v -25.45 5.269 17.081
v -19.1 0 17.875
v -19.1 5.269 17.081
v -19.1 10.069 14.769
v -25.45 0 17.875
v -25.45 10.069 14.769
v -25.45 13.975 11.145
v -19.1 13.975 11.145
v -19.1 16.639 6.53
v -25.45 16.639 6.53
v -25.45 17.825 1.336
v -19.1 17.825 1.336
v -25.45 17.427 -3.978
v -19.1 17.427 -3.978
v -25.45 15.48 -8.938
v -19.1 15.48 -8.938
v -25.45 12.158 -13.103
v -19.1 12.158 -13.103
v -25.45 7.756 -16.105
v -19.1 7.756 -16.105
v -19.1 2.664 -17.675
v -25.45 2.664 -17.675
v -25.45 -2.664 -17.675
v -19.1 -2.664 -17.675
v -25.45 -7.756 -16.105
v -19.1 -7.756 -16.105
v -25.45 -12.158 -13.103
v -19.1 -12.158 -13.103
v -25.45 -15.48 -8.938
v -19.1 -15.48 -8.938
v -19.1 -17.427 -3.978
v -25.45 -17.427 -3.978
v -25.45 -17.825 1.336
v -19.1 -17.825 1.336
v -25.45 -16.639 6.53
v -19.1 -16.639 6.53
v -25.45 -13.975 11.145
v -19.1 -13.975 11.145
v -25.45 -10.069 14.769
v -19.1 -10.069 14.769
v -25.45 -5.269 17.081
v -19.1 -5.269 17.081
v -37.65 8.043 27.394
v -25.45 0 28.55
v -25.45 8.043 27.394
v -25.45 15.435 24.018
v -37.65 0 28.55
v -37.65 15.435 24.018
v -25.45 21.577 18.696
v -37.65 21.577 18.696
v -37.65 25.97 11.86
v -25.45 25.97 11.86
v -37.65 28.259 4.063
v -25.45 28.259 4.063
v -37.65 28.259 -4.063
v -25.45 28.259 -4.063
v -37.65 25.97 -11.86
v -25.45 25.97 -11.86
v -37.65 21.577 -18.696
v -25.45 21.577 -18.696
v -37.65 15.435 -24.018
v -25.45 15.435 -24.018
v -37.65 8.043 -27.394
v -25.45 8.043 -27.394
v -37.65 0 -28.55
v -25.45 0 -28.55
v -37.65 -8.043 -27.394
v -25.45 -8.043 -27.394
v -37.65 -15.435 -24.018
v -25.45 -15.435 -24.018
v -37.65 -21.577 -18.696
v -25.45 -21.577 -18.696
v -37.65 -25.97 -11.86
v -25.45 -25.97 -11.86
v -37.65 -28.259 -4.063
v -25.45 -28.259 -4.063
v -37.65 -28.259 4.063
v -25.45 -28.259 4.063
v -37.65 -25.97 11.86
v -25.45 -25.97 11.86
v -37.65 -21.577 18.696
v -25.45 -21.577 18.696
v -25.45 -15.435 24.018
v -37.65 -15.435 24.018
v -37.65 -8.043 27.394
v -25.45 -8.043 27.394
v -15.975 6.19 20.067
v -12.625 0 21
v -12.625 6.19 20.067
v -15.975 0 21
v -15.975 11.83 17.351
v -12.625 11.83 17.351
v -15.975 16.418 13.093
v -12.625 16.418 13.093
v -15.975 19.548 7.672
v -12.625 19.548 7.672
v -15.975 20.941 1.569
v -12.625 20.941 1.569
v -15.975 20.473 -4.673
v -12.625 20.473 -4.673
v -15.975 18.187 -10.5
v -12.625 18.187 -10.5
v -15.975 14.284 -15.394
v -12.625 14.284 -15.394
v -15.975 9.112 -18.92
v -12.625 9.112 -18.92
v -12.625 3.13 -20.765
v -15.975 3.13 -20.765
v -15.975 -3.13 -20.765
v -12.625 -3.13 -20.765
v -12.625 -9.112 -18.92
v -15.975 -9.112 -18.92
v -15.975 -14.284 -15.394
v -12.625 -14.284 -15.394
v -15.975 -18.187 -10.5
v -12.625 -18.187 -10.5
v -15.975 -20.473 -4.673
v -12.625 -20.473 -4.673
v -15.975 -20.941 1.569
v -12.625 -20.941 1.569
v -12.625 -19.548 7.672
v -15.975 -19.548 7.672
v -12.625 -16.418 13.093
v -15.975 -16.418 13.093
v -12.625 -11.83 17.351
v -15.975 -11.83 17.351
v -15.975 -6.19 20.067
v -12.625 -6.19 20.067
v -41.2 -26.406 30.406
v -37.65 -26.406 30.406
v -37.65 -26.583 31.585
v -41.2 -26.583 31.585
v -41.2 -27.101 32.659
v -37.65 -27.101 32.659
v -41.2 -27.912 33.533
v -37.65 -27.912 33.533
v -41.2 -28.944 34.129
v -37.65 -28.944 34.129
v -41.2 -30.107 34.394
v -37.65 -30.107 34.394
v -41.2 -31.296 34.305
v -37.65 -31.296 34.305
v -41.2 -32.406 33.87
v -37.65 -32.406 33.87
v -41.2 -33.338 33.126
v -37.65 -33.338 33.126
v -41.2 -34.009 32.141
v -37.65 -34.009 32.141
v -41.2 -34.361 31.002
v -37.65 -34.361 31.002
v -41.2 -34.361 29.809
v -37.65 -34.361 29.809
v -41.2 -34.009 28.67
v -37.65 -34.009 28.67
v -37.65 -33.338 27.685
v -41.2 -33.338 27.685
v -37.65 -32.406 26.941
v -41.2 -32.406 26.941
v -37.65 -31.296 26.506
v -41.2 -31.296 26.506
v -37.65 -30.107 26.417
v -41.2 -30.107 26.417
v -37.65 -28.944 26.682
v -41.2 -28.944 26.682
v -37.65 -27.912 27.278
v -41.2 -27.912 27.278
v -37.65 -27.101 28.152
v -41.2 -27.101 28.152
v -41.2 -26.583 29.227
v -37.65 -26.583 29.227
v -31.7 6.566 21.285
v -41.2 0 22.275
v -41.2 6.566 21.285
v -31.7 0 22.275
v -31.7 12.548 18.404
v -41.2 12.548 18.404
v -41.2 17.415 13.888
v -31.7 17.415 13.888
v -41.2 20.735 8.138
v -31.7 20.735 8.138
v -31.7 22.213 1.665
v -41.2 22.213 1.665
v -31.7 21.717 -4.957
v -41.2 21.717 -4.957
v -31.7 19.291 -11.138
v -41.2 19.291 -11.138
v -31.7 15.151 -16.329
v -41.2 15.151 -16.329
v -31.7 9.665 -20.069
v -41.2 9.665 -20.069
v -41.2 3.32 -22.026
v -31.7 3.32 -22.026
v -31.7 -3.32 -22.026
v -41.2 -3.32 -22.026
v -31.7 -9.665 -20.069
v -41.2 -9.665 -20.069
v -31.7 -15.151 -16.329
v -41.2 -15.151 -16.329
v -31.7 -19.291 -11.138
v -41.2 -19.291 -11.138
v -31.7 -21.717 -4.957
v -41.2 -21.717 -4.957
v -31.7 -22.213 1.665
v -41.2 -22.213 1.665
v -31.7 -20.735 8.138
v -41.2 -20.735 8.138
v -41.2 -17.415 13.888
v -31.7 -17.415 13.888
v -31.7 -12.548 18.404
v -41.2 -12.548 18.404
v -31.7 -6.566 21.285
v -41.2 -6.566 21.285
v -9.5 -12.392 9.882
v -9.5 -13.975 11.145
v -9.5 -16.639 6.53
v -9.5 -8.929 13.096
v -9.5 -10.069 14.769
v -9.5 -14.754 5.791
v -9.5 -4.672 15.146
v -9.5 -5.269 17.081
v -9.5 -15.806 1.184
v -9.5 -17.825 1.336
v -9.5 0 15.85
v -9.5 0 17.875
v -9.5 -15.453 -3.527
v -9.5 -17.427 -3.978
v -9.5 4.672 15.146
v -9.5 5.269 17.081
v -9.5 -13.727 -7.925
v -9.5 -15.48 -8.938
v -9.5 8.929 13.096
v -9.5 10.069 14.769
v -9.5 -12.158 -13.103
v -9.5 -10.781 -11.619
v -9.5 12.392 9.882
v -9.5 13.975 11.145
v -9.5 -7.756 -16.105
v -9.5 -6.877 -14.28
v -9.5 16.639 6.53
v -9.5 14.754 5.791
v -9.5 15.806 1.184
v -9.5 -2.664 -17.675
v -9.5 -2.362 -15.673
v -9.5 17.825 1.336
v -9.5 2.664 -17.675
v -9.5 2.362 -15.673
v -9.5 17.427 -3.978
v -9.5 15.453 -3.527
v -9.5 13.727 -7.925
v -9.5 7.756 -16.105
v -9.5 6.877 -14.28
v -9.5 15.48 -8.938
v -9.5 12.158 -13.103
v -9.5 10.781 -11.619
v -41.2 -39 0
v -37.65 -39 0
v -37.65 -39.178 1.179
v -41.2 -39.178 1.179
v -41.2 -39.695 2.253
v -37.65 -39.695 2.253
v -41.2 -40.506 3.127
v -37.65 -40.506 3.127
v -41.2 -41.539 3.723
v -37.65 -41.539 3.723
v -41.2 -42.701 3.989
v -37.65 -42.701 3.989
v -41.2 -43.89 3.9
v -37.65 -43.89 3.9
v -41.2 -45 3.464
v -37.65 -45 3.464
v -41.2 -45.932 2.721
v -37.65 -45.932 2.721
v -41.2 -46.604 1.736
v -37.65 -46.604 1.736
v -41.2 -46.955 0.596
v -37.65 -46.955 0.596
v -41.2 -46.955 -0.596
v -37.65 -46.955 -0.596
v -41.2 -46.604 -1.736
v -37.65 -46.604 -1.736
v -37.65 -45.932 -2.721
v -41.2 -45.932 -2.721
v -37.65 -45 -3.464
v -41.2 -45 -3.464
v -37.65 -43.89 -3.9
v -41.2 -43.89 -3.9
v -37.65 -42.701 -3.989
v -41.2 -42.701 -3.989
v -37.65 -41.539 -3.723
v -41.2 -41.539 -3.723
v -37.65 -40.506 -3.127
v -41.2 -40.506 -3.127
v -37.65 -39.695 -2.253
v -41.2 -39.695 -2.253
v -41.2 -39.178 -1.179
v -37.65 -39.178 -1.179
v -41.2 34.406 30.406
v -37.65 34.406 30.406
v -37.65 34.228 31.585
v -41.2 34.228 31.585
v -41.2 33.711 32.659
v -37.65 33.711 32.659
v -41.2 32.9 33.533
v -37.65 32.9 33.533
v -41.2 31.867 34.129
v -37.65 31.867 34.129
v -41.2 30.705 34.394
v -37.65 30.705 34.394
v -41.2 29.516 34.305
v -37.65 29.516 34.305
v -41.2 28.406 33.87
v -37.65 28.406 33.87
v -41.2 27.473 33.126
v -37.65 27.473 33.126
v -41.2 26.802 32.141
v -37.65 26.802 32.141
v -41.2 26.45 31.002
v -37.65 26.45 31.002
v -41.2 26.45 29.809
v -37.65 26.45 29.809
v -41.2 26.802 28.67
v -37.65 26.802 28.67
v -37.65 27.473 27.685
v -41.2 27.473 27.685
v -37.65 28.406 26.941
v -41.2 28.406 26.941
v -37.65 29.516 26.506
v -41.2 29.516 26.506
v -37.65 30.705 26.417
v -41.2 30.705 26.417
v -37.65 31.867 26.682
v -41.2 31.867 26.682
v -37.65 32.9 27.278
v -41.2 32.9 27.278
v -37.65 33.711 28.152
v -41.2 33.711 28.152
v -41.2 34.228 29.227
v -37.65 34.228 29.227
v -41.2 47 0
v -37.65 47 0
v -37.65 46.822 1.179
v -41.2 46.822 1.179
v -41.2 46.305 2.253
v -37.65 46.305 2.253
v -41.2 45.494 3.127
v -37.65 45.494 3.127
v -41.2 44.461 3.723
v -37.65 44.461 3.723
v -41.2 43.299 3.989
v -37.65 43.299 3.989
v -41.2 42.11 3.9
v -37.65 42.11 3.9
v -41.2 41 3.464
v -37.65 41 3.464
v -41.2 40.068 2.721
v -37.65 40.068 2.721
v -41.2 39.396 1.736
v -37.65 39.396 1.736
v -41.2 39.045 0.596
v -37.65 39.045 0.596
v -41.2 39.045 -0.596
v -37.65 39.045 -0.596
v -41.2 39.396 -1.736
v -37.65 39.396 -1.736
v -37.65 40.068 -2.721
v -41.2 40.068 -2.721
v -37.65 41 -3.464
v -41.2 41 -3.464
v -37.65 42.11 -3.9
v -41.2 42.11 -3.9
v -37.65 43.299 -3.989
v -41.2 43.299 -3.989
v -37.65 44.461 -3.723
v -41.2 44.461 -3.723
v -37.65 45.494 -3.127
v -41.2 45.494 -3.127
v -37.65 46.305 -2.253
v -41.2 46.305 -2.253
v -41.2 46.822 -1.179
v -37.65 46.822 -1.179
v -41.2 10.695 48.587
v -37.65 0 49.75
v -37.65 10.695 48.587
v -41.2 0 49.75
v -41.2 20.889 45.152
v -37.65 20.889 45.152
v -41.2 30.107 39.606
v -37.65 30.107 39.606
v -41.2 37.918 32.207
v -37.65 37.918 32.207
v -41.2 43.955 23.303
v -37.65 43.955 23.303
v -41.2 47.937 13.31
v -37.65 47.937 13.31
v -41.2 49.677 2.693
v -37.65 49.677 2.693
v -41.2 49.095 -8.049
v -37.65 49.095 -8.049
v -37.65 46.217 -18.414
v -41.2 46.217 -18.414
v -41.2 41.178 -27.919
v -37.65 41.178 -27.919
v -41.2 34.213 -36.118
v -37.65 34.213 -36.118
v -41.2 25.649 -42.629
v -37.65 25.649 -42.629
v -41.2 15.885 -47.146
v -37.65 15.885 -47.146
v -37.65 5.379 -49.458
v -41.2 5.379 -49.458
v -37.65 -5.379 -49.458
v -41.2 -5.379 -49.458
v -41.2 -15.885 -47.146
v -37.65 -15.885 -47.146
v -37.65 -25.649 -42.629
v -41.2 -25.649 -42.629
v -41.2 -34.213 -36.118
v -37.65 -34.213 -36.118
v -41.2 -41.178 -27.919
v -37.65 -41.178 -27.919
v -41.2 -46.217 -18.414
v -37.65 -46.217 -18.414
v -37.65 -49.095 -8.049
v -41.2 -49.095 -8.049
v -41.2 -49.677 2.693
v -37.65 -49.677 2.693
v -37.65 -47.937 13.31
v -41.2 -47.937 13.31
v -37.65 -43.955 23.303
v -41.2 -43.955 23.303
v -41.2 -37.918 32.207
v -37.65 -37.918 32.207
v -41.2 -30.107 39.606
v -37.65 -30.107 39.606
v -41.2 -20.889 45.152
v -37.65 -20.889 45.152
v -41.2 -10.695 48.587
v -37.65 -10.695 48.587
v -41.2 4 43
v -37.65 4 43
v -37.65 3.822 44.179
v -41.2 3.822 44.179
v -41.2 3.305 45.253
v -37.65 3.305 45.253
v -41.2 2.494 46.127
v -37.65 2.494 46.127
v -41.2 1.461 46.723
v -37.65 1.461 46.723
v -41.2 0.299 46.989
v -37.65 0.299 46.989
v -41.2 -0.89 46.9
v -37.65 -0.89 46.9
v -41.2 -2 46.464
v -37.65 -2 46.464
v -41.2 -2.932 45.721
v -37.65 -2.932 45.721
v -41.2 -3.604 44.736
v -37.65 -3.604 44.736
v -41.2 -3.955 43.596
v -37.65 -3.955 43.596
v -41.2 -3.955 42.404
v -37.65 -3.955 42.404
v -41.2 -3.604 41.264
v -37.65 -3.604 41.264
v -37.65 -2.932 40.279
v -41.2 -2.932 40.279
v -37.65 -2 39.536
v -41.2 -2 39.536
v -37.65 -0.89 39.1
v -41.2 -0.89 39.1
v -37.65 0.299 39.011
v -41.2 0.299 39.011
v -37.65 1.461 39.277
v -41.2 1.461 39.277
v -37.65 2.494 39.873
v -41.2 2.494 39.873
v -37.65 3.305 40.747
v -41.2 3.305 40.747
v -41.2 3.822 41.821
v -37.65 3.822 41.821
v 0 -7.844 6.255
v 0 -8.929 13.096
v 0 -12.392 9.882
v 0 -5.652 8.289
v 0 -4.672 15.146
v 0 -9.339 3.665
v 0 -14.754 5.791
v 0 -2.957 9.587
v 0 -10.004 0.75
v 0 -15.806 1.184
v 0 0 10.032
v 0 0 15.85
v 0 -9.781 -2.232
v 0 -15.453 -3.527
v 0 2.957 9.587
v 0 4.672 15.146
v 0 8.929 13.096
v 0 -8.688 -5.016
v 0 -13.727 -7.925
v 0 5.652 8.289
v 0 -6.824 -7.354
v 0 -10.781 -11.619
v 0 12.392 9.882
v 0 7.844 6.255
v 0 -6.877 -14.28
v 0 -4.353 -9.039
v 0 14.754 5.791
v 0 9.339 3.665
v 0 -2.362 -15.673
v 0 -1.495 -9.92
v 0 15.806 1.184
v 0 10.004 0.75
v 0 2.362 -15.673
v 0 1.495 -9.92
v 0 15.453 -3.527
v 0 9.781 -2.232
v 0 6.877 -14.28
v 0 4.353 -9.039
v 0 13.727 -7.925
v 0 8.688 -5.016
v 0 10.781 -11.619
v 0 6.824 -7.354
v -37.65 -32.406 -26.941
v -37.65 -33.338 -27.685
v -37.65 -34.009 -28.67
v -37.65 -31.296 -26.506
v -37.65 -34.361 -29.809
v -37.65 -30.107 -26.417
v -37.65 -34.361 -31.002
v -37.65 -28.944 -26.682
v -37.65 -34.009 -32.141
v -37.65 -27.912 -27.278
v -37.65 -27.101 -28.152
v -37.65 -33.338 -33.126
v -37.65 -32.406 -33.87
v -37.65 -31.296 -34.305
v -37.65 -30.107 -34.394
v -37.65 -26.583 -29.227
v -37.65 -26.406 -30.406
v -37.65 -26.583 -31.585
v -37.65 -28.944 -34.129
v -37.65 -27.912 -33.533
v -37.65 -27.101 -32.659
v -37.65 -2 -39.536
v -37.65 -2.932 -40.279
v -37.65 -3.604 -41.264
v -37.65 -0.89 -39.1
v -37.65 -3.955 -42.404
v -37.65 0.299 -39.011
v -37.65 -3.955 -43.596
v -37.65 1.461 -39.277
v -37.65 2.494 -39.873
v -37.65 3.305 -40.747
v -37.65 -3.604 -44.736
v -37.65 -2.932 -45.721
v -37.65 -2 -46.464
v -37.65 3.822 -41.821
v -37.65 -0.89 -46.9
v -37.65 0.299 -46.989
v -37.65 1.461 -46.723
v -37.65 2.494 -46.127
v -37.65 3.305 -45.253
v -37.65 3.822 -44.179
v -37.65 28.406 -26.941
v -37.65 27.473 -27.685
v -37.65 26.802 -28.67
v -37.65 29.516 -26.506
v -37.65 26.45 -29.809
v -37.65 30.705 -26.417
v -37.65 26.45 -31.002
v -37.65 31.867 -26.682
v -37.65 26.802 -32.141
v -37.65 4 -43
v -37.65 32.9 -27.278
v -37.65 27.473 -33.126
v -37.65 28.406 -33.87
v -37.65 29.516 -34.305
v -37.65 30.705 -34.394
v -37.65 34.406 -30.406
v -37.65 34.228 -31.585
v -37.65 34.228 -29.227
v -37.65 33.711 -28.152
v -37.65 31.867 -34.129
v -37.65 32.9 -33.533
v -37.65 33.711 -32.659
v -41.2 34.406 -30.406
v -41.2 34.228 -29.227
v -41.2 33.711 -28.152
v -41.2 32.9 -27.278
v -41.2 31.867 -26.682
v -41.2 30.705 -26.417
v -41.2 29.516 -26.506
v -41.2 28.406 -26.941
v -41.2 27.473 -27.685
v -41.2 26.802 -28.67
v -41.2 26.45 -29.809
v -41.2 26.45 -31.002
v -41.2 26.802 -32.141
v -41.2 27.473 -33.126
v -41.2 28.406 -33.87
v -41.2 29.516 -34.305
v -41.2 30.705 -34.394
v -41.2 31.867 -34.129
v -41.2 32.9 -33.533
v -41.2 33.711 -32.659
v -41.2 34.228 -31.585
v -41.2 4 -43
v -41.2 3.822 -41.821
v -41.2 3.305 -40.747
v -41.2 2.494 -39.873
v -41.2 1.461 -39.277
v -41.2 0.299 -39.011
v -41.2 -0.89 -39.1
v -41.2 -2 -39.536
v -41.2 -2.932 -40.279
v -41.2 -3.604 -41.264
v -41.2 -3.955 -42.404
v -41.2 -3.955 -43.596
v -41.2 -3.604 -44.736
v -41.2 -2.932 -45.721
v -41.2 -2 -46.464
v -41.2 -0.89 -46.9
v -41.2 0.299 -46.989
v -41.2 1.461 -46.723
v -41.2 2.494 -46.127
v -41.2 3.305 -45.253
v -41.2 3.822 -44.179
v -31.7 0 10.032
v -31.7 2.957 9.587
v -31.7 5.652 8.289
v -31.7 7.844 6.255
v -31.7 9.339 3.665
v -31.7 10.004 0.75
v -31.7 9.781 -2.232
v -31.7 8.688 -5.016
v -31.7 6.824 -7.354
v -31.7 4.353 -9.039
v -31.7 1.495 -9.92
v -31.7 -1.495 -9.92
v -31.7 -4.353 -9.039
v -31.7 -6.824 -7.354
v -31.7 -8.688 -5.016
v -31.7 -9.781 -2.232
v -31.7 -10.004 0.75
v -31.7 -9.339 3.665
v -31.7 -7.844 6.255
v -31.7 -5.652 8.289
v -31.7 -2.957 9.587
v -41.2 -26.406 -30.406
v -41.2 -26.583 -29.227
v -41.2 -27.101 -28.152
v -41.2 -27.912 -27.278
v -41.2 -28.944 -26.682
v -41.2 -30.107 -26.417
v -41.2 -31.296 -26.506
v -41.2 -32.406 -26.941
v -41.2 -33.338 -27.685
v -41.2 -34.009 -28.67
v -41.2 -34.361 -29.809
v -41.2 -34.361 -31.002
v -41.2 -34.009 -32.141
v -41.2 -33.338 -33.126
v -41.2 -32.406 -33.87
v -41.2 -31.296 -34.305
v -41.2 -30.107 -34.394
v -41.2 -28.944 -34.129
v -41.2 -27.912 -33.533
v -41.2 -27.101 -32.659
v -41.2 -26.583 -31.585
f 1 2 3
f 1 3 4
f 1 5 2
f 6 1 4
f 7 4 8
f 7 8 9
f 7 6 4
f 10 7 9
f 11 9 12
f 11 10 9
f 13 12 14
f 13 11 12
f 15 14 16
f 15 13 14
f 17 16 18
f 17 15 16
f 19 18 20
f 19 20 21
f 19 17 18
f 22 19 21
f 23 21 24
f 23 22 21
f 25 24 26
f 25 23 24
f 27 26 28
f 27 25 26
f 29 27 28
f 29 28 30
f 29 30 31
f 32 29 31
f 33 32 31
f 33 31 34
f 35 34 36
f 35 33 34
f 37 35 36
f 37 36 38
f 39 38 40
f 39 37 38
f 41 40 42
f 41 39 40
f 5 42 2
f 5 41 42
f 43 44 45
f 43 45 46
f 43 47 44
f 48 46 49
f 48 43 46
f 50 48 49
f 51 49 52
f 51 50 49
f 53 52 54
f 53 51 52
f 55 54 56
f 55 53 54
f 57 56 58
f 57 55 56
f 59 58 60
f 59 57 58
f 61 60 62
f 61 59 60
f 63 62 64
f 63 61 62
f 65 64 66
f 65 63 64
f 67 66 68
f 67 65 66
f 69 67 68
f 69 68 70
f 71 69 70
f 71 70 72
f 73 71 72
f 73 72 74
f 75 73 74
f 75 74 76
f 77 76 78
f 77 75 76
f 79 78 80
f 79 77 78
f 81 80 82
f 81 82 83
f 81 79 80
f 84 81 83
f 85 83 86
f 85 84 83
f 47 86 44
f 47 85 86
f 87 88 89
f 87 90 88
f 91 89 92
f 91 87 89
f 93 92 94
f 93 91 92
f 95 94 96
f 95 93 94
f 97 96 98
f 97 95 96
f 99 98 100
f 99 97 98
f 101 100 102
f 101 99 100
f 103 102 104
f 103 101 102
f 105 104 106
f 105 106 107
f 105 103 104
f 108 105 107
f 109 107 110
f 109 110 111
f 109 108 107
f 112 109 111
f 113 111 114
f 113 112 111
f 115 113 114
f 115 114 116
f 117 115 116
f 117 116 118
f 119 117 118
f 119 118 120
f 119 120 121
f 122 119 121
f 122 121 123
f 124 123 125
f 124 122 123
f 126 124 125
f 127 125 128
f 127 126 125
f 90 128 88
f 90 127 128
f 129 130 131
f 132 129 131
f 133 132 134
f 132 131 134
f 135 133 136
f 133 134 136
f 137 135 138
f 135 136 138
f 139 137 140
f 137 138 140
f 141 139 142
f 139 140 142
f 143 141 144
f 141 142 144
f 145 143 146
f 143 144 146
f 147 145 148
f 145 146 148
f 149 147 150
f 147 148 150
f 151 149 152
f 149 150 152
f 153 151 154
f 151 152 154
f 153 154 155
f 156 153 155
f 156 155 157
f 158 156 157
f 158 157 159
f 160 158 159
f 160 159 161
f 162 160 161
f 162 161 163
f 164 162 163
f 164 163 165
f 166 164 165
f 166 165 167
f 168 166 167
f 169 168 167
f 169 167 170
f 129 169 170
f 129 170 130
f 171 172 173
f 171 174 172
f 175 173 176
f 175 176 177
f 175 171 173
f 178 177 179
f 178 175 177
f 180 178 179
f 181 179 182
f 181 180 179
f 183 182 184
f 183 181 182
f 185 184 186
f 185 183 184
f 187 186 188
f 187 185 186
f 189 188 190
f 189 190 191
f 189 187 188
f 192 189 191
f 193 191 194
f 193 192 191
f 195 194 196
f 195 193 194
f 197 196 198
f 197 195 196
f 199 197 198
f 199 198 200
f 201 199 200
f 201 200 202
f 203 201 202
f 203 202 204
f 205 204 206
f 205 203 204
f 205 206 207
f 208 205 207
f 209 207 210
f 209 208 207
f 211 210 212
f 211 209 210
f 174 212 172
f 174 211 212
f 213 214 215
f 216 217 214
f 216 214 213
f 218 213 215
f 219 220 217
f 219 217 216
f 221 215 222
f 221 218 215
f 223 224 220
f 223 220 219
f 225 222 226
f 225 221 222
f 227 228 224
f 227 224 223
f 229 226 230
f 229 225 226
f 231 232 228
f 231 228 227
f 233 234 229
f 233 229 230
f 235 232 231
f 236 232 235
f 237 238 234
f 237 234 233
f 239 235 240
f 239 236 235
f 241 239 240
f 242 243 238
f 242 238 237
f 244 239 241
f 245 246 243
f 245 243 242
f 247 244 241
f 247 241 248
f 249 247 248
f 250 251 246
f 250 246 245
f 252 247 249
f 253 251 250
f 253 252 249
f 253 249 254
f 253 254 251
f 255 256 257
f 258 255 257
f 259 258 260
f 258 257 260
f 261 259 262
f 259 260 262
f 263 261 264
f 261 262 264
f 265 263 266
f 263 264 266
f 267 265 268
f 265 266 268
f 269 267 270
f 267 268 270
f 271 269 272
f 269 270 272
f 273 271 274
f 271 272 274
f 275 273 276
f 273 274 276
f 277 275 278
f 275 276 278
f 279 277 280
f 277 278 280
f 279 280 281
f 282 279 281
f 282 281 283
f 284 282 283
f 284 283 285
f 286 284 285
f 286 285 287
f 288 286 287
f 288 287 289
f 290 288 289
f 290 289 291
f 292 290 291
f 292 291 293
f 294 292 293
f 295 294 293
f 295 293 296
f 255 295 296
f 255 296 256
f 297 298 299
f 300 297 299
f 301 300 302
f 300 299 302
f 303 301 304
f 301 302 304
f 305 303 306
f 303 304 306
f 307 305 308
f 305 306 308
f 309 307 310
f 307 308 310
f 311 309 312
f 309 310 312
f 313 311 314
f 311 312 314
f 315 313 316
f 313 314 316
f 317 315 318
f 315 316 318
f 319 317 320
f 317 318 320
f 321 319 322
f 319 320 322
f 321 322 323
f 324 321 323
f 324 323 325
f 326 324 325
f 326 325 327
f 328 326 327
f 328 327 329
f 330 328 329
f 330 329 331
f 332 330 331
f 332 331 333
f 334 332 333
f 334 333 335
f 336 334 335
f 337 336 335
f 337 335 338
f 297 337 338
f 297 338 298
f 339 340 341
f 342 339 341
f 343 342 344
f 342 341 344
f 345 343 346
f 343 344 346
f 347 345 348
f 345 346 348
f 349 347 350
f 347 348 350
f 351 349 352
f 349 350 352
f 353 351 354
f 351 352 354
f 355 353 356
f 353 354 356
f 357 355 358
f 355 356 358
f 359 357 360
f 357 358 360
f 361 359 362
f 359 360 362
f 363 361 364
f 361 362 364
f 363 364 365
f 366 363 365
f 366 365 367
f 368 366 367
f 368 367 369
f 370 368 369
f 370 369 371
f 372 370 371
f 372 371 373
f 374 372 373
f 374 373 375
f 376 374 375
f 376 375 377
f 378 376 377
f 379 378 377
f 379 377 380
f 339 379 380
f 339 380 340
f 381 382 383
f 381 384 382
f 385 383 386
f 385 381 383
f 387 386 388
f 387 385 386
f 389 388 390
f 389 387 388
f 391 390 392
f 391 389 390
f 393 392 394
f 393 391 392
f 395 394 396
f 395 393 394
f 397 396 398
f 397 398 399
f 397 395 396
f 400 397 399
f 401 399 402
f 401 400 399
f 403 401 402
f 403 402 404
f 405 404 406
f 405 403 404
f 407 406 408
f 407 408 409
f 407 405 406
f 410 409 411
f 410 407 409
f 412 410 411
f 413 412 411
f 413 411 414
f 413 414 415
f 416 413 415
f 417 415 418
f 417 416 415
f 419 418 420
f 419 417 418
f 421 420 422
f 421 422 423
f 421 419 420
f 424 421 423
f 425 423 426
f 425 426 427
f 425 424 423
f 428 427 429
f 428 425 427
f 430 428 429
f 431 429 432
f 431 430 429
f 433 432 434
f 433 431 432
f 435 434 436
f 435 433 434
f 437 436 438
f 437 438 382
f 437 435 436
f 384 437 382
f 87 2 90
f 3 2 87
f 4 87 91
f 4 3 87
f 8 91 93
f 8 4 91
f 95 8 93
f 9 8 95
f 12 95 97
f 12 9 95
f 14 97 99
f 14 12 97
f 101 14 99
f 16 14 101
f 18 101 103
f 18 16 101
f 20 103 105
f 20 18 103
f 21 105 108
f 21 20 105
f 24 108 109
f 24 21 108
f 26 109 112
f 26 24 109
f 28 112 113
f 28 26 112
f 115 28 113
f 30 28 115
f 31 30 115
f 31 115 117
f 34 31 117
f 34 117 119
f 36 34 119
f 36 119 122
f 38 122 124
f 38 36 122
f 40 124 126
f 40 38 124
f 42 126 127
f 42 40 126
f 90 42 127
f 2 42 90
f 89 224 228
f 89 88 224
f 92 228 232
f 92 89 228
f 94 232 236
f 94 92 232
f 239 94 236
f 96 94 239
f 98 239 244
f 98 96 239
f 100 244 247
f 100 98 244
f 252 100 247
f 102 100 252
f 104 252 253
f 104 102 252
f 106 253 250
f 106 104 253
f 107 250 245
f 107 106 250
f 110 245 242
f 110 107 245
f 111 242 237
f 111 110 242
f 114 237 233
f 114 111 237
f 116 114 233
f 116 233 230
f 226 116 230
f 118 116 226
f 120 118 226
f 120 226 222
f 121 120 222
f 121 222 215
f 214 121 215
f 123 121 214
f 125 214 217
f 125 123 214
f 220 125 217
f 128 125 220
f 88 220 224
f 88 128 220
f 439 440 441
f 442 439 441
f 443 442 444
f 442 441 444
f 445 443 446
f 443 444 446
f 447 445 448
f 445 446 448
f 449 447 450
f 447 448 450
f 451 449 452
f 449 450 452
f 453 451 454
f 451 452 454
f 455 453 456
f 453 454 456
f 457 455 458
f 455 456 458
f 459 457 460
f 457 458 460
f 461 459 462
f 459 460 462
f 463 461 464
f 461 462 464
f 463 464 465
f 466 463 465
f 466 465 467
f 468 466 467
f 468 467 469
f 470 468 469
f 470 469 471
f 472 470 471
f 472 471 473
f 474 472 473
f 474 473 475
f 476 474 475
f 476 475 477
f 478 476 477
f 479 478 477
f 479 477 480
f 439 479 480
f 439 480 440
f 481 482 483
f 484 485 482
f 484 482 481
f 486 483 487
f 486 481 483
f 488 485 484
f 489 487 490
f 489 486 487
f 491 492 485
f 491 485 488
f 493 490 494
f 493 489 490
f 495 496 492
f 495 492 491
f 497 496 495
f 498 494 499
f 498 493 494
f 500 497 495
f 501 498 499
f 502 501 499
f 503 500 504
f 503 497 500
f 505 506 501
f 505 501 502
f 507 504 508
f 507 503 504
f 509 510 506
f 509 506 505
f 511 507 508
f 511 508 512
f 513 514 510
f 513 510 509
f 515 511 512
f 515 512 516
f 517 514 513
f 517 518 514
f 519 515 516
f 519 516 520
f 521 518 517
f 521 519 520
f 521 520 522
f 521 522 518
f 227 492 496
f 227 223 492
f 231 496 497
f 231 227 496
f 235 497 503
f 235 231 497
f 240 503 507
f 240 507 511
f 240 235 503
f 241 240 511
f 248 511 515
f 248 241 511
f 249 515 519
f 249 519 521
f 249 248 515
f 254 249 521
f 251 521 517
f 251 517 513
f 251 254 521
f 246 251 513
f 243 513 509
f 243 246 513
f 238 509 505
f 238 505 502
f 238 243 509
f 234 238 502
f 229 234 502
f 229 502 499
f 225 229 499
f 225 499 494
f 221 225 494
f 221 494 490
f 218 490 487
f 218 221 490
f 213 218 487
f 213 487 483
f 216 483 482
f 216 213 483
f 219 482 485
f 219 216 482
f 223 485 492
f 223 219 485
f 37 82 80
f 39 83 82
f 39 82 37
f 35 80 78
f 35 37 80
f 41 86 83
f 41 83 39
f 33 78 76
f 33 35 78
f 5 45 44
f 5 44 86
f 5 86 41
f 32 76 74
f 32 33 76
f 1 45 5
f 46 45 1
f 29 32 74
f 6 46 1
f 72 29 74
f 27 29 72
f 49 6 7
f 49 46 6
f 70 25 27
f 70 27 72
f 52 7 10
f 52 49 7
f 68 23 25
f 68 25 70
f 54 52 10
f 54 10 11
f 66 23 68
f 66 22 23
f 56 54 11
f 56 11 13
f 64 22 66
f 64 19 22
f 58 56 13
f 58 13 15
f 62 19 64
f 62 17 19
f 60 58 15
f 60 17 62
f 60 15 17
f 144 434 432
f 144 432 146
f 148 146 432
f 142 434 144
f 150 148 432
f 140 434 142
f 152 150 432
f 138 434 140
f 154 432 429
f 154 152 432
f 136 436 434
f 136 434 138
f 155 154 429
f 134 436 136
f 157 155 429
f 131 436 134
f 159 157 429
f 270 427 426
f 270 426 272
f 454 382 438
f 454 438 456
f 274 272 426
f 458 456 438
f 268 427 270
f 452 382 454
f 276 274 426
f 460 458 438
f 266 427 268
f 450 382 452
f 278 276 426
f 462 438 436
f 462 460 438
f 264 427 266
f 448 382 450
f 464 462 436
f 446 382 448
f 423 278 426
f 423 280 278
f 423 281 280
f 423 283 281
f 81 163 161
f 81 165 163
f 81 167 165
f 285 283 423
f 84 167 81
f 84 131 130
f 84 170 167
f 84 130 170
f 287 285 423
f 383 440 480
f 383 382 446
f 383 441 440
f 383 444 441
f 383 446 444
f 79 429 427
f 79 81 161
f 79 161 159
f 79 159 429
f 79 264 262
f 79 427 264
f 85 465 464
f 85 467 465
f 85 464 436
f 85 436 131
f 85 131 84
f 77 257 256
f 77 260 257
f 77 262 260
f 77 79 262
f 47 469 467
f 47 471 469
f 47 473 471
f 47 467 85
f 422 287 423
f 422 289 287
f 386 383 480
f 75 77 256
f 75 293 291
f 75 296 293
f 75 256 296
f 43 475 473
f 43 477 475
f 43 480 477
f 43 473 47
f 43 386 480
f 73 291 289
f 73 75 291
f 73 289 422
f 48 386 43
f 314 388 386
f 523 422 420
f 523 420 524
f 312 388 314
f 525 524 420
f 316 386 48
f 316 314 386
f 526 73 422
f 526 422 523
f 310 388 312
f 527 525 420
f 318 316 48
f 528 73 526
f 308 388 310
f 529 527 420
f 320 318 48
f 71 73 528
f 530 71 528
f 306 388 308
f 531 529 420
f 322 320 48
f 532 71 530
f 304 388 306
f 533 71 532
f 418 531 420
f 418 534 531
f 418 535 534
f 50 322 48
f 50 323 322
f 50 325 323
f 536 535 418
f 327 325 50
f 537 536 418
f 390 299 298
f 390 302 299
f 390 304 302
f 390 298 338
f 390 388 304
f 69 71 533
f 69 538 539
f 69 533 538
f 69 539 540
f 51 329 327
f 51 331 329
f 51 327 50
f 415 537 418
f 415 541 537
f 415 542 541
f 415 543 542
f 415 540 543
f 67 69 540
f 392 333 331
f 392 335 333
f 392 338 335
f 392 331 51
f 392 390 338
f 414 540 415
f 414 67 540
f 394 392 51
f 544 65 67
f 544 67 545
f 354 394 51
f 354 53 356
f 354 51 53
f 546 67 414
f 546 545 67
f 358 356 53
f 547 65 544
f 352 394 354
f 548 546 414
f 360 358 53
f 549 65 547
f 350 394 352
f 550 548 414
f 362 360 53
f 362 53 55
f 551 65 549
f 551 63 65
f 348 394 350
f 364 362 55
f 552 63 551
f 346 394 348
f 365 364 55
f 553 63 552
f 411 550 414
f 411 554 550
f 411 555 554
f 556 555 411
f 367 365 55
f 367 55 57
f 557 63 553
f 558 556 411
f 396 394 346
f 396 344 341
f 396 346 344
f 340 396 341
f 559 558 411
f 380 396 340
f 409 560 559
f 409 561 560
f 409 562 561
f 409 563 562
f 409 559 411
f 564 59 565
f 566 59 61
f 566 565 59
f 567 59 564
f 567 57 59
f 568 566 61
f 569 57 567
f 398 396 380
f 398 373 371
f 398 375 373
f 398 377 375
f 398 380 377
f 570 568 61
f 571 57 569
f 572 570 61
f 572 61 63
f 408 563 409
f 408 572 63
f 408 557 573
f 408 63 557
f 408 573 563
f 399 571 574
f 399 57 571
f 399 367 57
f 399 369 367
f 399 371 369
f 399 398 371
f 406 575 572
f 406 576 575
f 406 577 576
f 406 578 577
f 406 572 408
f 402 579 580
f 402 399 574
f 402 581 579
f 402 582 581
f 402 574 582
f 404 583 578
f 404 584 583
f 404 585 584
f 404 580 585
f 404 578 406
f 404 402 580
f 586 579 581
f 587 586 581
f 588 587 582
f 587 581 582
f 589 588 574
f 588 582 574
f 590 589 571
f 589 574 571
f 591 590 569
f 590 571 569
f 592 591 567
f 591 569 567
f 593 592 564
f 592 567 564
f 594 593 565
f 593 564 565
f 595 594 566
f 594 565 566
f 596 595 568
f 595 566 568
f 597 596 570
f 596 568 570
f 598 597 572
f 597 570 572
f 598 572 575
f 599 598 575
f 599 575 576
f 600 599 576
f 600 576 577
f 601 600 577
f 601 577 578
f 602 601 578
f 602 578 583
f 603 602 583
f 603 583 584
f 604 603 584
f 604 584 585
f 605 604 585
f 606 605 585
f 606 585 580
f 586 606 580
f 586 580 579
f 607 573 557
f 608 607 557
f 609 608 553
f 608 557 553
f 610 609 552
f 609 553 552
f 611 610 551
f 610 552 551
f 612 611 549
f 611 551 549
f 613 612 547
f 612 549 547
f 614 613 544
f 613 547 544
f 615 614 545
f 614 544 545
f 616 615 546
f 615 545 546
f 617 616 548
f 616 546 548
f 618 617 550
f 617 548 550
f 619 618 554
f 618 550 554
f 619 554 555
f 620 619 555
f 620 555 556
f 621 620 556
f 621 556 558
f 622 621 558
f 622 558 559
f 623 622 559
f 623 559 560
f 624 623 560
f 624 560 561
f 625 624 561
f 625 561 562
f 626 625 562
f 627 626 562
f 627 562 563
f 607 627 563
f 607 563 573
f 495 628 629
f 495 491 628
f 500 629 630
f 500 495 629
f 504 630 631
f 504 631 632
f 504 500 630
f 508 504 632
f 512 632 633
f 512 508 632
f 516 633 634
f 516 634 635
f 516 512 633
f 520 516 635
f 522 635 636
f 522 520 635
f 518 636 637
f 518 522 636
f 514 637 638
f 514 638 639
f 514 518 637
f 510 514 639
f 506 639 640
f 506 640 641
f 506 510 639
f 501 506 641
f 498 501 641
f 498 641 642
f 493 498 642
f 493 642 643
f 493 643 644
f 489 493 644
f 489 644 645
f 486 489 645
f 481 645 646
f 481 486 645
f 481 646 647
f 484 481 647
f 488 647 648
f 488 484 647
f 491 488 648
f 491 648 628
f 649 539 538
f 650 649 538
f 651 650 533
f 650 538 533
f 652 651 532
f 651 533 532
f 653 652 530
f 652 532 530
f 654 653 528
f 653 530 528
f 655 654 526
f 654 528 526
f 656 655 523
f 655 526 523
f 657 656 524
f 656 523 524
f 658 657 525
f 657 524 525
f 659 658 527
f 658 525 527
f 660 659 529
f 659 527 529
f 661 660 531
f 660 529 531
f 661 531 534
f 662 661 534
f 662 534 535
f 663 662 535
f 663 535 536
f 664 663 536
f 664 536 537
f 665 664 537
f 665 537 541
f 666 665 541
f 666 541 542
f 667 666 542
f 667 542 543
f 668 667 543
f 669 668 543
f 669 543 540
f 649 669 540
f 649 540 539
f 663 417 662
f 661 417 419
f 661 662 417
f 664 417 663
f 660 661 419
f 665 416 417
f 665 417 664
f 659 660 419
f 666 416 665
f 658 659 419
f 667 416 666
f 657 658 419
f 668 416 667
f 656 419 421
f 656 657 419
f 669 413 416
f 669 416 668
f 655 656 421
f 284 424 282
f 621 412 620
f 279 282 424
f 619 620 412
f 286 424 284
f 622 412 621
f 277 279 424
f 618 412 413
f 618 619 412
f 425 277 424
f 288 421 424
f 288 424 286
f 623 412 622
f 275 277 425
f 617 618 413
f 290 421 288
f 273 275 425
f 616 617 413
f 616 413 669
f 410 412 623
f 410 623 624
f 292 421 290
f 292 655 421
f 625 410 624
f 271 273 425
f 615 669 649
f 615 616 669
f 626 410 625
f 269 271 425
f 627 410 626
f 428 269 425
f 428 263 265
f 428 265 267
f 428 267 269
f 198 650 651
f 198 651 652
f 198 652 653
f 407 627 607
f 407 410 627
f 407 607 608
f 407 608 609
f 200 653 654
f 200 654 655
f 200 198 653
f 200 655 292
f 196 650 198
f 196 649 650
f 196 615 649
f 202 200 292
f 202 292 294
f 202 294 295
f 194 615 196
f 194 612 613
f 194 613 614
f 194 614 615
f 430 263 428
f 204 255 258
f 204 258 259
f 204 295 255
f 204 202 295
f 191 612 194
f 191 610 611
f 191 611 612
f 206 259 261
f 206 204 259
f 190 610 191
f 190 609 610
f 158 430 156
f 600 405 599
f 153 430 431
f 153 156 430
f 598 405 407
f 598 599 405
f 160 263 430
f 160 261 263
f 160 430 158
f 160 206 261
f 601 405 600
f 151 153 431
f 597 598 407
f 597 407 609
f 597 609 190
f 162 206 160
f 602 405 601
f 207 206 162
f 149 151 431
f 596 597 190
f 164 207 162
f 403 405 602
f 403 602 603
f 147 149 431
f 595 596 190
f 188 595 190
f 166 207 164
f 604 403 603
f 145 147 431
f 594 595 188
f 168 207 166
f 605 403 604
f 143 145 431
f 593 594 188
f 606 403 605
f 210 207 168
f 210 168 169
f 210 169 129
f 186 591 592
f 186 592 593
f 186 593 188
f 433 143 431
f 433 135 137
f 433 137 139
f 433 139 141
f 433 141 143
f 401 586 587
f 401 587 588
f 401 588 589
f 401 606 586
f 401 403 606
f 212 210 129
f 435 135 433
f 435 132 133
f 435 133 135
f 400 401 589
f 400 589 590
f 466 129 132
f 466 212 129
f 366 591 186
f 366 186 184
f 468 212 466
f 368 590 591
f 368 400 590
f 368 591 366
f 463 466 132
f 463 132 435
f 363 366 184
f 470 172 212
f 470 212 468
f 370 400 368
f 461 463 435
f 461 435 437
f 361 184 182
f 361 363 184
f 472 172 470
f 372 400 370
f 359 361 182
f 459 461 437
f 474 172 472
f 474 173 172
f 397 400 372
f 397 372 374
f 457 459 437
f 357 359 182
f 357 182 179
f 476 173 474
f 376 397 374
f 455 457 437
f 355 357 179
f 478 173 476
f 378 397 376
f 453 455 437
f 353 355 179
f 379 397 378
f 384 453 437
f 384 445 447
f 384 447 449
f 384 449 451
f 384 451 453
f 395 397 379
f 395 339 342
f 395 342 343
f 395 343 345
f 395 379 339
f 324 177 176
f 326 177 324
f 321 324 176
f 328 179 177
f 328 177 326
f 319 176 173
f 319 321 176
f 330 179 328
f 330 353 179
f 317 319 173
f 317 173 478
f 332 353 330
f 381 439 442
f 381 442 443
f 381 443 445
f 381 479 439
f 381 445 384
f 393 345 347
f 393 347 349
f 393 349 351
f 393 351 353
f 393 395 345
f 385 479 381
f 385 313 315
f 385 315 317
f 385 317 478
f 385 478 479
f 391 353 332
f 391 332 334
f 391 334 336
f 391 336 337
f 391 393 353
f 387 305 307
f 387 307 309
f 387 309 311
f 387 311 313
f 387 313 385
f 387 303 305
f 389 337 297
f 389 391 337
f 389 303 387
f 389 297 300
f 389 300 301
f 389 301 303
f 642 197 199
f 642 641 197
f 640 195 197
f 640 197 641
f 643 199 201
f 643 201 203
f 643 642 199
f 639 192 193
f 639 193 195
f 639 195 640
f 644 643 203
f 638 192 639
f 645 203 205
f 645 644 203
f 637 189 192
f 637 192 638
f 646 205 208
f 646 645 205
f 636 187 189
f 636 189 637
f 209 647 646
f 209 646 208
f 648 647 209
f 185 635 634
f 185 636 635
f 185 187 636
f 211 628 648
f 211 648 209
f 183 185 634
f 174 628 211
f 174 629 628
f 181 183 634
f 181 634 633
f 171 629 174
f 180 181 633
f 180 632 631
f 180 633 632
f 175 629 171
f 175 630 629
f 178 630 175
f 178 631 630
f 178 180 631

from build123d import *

# Parameters (mm, degrees)
F2_R     = 4
F3_DEPTH = 3.551


with BuildPart() as f1:
    # F0 (on Front) → F1 (revolve)
    with BuildSketch(Plane.XZ):
        Polygon((-31.7, 10.0325), (0, 10.0325), (0, 15.85), (-9.5, 15.85), (-9.5, 17.875), (-12.625, 21), (-15.975, 21), (-19.1, 17.875), (-25.45, 17.875), (-25.45, 28.55), (-37.65, 28.55), (-37.65, 49.75), (-41.2, 49.75), (-41.2, 22.275), (-31.7, 22.275), align=None)
    revolve(axis=Axis((-20.6, 0, 0), (-1, 0, 0)))

    # F2 (on face) → F3 (cut, through all)
    with BuildSketch(Plane.YZ.offset(-37.65)):
        with Locations((0, 43)):
            Circle(F2_R)
        with Locations((30.405592, 30.405592)):
            Circle(F2_R)
        with Locations((43, 0)):
            Circle(F2_R)
        with Locations((30.405592, -30.405592)):
            Circle(F2_R)
        with Locations((0, -43)):
            Circle(F2_R)
        with Locations((-30.405592, -30.405592)):
            Circle(F2_R)
        with Locations((-43, 0)):
            Circle(F2_R)
        with Locations((-30.405592, 30.405592)):
            Circle(F2_R)
    extrude(amount=-F3_DEPTH, mode=Mode.SUBTRACT)


solid = f1.part
